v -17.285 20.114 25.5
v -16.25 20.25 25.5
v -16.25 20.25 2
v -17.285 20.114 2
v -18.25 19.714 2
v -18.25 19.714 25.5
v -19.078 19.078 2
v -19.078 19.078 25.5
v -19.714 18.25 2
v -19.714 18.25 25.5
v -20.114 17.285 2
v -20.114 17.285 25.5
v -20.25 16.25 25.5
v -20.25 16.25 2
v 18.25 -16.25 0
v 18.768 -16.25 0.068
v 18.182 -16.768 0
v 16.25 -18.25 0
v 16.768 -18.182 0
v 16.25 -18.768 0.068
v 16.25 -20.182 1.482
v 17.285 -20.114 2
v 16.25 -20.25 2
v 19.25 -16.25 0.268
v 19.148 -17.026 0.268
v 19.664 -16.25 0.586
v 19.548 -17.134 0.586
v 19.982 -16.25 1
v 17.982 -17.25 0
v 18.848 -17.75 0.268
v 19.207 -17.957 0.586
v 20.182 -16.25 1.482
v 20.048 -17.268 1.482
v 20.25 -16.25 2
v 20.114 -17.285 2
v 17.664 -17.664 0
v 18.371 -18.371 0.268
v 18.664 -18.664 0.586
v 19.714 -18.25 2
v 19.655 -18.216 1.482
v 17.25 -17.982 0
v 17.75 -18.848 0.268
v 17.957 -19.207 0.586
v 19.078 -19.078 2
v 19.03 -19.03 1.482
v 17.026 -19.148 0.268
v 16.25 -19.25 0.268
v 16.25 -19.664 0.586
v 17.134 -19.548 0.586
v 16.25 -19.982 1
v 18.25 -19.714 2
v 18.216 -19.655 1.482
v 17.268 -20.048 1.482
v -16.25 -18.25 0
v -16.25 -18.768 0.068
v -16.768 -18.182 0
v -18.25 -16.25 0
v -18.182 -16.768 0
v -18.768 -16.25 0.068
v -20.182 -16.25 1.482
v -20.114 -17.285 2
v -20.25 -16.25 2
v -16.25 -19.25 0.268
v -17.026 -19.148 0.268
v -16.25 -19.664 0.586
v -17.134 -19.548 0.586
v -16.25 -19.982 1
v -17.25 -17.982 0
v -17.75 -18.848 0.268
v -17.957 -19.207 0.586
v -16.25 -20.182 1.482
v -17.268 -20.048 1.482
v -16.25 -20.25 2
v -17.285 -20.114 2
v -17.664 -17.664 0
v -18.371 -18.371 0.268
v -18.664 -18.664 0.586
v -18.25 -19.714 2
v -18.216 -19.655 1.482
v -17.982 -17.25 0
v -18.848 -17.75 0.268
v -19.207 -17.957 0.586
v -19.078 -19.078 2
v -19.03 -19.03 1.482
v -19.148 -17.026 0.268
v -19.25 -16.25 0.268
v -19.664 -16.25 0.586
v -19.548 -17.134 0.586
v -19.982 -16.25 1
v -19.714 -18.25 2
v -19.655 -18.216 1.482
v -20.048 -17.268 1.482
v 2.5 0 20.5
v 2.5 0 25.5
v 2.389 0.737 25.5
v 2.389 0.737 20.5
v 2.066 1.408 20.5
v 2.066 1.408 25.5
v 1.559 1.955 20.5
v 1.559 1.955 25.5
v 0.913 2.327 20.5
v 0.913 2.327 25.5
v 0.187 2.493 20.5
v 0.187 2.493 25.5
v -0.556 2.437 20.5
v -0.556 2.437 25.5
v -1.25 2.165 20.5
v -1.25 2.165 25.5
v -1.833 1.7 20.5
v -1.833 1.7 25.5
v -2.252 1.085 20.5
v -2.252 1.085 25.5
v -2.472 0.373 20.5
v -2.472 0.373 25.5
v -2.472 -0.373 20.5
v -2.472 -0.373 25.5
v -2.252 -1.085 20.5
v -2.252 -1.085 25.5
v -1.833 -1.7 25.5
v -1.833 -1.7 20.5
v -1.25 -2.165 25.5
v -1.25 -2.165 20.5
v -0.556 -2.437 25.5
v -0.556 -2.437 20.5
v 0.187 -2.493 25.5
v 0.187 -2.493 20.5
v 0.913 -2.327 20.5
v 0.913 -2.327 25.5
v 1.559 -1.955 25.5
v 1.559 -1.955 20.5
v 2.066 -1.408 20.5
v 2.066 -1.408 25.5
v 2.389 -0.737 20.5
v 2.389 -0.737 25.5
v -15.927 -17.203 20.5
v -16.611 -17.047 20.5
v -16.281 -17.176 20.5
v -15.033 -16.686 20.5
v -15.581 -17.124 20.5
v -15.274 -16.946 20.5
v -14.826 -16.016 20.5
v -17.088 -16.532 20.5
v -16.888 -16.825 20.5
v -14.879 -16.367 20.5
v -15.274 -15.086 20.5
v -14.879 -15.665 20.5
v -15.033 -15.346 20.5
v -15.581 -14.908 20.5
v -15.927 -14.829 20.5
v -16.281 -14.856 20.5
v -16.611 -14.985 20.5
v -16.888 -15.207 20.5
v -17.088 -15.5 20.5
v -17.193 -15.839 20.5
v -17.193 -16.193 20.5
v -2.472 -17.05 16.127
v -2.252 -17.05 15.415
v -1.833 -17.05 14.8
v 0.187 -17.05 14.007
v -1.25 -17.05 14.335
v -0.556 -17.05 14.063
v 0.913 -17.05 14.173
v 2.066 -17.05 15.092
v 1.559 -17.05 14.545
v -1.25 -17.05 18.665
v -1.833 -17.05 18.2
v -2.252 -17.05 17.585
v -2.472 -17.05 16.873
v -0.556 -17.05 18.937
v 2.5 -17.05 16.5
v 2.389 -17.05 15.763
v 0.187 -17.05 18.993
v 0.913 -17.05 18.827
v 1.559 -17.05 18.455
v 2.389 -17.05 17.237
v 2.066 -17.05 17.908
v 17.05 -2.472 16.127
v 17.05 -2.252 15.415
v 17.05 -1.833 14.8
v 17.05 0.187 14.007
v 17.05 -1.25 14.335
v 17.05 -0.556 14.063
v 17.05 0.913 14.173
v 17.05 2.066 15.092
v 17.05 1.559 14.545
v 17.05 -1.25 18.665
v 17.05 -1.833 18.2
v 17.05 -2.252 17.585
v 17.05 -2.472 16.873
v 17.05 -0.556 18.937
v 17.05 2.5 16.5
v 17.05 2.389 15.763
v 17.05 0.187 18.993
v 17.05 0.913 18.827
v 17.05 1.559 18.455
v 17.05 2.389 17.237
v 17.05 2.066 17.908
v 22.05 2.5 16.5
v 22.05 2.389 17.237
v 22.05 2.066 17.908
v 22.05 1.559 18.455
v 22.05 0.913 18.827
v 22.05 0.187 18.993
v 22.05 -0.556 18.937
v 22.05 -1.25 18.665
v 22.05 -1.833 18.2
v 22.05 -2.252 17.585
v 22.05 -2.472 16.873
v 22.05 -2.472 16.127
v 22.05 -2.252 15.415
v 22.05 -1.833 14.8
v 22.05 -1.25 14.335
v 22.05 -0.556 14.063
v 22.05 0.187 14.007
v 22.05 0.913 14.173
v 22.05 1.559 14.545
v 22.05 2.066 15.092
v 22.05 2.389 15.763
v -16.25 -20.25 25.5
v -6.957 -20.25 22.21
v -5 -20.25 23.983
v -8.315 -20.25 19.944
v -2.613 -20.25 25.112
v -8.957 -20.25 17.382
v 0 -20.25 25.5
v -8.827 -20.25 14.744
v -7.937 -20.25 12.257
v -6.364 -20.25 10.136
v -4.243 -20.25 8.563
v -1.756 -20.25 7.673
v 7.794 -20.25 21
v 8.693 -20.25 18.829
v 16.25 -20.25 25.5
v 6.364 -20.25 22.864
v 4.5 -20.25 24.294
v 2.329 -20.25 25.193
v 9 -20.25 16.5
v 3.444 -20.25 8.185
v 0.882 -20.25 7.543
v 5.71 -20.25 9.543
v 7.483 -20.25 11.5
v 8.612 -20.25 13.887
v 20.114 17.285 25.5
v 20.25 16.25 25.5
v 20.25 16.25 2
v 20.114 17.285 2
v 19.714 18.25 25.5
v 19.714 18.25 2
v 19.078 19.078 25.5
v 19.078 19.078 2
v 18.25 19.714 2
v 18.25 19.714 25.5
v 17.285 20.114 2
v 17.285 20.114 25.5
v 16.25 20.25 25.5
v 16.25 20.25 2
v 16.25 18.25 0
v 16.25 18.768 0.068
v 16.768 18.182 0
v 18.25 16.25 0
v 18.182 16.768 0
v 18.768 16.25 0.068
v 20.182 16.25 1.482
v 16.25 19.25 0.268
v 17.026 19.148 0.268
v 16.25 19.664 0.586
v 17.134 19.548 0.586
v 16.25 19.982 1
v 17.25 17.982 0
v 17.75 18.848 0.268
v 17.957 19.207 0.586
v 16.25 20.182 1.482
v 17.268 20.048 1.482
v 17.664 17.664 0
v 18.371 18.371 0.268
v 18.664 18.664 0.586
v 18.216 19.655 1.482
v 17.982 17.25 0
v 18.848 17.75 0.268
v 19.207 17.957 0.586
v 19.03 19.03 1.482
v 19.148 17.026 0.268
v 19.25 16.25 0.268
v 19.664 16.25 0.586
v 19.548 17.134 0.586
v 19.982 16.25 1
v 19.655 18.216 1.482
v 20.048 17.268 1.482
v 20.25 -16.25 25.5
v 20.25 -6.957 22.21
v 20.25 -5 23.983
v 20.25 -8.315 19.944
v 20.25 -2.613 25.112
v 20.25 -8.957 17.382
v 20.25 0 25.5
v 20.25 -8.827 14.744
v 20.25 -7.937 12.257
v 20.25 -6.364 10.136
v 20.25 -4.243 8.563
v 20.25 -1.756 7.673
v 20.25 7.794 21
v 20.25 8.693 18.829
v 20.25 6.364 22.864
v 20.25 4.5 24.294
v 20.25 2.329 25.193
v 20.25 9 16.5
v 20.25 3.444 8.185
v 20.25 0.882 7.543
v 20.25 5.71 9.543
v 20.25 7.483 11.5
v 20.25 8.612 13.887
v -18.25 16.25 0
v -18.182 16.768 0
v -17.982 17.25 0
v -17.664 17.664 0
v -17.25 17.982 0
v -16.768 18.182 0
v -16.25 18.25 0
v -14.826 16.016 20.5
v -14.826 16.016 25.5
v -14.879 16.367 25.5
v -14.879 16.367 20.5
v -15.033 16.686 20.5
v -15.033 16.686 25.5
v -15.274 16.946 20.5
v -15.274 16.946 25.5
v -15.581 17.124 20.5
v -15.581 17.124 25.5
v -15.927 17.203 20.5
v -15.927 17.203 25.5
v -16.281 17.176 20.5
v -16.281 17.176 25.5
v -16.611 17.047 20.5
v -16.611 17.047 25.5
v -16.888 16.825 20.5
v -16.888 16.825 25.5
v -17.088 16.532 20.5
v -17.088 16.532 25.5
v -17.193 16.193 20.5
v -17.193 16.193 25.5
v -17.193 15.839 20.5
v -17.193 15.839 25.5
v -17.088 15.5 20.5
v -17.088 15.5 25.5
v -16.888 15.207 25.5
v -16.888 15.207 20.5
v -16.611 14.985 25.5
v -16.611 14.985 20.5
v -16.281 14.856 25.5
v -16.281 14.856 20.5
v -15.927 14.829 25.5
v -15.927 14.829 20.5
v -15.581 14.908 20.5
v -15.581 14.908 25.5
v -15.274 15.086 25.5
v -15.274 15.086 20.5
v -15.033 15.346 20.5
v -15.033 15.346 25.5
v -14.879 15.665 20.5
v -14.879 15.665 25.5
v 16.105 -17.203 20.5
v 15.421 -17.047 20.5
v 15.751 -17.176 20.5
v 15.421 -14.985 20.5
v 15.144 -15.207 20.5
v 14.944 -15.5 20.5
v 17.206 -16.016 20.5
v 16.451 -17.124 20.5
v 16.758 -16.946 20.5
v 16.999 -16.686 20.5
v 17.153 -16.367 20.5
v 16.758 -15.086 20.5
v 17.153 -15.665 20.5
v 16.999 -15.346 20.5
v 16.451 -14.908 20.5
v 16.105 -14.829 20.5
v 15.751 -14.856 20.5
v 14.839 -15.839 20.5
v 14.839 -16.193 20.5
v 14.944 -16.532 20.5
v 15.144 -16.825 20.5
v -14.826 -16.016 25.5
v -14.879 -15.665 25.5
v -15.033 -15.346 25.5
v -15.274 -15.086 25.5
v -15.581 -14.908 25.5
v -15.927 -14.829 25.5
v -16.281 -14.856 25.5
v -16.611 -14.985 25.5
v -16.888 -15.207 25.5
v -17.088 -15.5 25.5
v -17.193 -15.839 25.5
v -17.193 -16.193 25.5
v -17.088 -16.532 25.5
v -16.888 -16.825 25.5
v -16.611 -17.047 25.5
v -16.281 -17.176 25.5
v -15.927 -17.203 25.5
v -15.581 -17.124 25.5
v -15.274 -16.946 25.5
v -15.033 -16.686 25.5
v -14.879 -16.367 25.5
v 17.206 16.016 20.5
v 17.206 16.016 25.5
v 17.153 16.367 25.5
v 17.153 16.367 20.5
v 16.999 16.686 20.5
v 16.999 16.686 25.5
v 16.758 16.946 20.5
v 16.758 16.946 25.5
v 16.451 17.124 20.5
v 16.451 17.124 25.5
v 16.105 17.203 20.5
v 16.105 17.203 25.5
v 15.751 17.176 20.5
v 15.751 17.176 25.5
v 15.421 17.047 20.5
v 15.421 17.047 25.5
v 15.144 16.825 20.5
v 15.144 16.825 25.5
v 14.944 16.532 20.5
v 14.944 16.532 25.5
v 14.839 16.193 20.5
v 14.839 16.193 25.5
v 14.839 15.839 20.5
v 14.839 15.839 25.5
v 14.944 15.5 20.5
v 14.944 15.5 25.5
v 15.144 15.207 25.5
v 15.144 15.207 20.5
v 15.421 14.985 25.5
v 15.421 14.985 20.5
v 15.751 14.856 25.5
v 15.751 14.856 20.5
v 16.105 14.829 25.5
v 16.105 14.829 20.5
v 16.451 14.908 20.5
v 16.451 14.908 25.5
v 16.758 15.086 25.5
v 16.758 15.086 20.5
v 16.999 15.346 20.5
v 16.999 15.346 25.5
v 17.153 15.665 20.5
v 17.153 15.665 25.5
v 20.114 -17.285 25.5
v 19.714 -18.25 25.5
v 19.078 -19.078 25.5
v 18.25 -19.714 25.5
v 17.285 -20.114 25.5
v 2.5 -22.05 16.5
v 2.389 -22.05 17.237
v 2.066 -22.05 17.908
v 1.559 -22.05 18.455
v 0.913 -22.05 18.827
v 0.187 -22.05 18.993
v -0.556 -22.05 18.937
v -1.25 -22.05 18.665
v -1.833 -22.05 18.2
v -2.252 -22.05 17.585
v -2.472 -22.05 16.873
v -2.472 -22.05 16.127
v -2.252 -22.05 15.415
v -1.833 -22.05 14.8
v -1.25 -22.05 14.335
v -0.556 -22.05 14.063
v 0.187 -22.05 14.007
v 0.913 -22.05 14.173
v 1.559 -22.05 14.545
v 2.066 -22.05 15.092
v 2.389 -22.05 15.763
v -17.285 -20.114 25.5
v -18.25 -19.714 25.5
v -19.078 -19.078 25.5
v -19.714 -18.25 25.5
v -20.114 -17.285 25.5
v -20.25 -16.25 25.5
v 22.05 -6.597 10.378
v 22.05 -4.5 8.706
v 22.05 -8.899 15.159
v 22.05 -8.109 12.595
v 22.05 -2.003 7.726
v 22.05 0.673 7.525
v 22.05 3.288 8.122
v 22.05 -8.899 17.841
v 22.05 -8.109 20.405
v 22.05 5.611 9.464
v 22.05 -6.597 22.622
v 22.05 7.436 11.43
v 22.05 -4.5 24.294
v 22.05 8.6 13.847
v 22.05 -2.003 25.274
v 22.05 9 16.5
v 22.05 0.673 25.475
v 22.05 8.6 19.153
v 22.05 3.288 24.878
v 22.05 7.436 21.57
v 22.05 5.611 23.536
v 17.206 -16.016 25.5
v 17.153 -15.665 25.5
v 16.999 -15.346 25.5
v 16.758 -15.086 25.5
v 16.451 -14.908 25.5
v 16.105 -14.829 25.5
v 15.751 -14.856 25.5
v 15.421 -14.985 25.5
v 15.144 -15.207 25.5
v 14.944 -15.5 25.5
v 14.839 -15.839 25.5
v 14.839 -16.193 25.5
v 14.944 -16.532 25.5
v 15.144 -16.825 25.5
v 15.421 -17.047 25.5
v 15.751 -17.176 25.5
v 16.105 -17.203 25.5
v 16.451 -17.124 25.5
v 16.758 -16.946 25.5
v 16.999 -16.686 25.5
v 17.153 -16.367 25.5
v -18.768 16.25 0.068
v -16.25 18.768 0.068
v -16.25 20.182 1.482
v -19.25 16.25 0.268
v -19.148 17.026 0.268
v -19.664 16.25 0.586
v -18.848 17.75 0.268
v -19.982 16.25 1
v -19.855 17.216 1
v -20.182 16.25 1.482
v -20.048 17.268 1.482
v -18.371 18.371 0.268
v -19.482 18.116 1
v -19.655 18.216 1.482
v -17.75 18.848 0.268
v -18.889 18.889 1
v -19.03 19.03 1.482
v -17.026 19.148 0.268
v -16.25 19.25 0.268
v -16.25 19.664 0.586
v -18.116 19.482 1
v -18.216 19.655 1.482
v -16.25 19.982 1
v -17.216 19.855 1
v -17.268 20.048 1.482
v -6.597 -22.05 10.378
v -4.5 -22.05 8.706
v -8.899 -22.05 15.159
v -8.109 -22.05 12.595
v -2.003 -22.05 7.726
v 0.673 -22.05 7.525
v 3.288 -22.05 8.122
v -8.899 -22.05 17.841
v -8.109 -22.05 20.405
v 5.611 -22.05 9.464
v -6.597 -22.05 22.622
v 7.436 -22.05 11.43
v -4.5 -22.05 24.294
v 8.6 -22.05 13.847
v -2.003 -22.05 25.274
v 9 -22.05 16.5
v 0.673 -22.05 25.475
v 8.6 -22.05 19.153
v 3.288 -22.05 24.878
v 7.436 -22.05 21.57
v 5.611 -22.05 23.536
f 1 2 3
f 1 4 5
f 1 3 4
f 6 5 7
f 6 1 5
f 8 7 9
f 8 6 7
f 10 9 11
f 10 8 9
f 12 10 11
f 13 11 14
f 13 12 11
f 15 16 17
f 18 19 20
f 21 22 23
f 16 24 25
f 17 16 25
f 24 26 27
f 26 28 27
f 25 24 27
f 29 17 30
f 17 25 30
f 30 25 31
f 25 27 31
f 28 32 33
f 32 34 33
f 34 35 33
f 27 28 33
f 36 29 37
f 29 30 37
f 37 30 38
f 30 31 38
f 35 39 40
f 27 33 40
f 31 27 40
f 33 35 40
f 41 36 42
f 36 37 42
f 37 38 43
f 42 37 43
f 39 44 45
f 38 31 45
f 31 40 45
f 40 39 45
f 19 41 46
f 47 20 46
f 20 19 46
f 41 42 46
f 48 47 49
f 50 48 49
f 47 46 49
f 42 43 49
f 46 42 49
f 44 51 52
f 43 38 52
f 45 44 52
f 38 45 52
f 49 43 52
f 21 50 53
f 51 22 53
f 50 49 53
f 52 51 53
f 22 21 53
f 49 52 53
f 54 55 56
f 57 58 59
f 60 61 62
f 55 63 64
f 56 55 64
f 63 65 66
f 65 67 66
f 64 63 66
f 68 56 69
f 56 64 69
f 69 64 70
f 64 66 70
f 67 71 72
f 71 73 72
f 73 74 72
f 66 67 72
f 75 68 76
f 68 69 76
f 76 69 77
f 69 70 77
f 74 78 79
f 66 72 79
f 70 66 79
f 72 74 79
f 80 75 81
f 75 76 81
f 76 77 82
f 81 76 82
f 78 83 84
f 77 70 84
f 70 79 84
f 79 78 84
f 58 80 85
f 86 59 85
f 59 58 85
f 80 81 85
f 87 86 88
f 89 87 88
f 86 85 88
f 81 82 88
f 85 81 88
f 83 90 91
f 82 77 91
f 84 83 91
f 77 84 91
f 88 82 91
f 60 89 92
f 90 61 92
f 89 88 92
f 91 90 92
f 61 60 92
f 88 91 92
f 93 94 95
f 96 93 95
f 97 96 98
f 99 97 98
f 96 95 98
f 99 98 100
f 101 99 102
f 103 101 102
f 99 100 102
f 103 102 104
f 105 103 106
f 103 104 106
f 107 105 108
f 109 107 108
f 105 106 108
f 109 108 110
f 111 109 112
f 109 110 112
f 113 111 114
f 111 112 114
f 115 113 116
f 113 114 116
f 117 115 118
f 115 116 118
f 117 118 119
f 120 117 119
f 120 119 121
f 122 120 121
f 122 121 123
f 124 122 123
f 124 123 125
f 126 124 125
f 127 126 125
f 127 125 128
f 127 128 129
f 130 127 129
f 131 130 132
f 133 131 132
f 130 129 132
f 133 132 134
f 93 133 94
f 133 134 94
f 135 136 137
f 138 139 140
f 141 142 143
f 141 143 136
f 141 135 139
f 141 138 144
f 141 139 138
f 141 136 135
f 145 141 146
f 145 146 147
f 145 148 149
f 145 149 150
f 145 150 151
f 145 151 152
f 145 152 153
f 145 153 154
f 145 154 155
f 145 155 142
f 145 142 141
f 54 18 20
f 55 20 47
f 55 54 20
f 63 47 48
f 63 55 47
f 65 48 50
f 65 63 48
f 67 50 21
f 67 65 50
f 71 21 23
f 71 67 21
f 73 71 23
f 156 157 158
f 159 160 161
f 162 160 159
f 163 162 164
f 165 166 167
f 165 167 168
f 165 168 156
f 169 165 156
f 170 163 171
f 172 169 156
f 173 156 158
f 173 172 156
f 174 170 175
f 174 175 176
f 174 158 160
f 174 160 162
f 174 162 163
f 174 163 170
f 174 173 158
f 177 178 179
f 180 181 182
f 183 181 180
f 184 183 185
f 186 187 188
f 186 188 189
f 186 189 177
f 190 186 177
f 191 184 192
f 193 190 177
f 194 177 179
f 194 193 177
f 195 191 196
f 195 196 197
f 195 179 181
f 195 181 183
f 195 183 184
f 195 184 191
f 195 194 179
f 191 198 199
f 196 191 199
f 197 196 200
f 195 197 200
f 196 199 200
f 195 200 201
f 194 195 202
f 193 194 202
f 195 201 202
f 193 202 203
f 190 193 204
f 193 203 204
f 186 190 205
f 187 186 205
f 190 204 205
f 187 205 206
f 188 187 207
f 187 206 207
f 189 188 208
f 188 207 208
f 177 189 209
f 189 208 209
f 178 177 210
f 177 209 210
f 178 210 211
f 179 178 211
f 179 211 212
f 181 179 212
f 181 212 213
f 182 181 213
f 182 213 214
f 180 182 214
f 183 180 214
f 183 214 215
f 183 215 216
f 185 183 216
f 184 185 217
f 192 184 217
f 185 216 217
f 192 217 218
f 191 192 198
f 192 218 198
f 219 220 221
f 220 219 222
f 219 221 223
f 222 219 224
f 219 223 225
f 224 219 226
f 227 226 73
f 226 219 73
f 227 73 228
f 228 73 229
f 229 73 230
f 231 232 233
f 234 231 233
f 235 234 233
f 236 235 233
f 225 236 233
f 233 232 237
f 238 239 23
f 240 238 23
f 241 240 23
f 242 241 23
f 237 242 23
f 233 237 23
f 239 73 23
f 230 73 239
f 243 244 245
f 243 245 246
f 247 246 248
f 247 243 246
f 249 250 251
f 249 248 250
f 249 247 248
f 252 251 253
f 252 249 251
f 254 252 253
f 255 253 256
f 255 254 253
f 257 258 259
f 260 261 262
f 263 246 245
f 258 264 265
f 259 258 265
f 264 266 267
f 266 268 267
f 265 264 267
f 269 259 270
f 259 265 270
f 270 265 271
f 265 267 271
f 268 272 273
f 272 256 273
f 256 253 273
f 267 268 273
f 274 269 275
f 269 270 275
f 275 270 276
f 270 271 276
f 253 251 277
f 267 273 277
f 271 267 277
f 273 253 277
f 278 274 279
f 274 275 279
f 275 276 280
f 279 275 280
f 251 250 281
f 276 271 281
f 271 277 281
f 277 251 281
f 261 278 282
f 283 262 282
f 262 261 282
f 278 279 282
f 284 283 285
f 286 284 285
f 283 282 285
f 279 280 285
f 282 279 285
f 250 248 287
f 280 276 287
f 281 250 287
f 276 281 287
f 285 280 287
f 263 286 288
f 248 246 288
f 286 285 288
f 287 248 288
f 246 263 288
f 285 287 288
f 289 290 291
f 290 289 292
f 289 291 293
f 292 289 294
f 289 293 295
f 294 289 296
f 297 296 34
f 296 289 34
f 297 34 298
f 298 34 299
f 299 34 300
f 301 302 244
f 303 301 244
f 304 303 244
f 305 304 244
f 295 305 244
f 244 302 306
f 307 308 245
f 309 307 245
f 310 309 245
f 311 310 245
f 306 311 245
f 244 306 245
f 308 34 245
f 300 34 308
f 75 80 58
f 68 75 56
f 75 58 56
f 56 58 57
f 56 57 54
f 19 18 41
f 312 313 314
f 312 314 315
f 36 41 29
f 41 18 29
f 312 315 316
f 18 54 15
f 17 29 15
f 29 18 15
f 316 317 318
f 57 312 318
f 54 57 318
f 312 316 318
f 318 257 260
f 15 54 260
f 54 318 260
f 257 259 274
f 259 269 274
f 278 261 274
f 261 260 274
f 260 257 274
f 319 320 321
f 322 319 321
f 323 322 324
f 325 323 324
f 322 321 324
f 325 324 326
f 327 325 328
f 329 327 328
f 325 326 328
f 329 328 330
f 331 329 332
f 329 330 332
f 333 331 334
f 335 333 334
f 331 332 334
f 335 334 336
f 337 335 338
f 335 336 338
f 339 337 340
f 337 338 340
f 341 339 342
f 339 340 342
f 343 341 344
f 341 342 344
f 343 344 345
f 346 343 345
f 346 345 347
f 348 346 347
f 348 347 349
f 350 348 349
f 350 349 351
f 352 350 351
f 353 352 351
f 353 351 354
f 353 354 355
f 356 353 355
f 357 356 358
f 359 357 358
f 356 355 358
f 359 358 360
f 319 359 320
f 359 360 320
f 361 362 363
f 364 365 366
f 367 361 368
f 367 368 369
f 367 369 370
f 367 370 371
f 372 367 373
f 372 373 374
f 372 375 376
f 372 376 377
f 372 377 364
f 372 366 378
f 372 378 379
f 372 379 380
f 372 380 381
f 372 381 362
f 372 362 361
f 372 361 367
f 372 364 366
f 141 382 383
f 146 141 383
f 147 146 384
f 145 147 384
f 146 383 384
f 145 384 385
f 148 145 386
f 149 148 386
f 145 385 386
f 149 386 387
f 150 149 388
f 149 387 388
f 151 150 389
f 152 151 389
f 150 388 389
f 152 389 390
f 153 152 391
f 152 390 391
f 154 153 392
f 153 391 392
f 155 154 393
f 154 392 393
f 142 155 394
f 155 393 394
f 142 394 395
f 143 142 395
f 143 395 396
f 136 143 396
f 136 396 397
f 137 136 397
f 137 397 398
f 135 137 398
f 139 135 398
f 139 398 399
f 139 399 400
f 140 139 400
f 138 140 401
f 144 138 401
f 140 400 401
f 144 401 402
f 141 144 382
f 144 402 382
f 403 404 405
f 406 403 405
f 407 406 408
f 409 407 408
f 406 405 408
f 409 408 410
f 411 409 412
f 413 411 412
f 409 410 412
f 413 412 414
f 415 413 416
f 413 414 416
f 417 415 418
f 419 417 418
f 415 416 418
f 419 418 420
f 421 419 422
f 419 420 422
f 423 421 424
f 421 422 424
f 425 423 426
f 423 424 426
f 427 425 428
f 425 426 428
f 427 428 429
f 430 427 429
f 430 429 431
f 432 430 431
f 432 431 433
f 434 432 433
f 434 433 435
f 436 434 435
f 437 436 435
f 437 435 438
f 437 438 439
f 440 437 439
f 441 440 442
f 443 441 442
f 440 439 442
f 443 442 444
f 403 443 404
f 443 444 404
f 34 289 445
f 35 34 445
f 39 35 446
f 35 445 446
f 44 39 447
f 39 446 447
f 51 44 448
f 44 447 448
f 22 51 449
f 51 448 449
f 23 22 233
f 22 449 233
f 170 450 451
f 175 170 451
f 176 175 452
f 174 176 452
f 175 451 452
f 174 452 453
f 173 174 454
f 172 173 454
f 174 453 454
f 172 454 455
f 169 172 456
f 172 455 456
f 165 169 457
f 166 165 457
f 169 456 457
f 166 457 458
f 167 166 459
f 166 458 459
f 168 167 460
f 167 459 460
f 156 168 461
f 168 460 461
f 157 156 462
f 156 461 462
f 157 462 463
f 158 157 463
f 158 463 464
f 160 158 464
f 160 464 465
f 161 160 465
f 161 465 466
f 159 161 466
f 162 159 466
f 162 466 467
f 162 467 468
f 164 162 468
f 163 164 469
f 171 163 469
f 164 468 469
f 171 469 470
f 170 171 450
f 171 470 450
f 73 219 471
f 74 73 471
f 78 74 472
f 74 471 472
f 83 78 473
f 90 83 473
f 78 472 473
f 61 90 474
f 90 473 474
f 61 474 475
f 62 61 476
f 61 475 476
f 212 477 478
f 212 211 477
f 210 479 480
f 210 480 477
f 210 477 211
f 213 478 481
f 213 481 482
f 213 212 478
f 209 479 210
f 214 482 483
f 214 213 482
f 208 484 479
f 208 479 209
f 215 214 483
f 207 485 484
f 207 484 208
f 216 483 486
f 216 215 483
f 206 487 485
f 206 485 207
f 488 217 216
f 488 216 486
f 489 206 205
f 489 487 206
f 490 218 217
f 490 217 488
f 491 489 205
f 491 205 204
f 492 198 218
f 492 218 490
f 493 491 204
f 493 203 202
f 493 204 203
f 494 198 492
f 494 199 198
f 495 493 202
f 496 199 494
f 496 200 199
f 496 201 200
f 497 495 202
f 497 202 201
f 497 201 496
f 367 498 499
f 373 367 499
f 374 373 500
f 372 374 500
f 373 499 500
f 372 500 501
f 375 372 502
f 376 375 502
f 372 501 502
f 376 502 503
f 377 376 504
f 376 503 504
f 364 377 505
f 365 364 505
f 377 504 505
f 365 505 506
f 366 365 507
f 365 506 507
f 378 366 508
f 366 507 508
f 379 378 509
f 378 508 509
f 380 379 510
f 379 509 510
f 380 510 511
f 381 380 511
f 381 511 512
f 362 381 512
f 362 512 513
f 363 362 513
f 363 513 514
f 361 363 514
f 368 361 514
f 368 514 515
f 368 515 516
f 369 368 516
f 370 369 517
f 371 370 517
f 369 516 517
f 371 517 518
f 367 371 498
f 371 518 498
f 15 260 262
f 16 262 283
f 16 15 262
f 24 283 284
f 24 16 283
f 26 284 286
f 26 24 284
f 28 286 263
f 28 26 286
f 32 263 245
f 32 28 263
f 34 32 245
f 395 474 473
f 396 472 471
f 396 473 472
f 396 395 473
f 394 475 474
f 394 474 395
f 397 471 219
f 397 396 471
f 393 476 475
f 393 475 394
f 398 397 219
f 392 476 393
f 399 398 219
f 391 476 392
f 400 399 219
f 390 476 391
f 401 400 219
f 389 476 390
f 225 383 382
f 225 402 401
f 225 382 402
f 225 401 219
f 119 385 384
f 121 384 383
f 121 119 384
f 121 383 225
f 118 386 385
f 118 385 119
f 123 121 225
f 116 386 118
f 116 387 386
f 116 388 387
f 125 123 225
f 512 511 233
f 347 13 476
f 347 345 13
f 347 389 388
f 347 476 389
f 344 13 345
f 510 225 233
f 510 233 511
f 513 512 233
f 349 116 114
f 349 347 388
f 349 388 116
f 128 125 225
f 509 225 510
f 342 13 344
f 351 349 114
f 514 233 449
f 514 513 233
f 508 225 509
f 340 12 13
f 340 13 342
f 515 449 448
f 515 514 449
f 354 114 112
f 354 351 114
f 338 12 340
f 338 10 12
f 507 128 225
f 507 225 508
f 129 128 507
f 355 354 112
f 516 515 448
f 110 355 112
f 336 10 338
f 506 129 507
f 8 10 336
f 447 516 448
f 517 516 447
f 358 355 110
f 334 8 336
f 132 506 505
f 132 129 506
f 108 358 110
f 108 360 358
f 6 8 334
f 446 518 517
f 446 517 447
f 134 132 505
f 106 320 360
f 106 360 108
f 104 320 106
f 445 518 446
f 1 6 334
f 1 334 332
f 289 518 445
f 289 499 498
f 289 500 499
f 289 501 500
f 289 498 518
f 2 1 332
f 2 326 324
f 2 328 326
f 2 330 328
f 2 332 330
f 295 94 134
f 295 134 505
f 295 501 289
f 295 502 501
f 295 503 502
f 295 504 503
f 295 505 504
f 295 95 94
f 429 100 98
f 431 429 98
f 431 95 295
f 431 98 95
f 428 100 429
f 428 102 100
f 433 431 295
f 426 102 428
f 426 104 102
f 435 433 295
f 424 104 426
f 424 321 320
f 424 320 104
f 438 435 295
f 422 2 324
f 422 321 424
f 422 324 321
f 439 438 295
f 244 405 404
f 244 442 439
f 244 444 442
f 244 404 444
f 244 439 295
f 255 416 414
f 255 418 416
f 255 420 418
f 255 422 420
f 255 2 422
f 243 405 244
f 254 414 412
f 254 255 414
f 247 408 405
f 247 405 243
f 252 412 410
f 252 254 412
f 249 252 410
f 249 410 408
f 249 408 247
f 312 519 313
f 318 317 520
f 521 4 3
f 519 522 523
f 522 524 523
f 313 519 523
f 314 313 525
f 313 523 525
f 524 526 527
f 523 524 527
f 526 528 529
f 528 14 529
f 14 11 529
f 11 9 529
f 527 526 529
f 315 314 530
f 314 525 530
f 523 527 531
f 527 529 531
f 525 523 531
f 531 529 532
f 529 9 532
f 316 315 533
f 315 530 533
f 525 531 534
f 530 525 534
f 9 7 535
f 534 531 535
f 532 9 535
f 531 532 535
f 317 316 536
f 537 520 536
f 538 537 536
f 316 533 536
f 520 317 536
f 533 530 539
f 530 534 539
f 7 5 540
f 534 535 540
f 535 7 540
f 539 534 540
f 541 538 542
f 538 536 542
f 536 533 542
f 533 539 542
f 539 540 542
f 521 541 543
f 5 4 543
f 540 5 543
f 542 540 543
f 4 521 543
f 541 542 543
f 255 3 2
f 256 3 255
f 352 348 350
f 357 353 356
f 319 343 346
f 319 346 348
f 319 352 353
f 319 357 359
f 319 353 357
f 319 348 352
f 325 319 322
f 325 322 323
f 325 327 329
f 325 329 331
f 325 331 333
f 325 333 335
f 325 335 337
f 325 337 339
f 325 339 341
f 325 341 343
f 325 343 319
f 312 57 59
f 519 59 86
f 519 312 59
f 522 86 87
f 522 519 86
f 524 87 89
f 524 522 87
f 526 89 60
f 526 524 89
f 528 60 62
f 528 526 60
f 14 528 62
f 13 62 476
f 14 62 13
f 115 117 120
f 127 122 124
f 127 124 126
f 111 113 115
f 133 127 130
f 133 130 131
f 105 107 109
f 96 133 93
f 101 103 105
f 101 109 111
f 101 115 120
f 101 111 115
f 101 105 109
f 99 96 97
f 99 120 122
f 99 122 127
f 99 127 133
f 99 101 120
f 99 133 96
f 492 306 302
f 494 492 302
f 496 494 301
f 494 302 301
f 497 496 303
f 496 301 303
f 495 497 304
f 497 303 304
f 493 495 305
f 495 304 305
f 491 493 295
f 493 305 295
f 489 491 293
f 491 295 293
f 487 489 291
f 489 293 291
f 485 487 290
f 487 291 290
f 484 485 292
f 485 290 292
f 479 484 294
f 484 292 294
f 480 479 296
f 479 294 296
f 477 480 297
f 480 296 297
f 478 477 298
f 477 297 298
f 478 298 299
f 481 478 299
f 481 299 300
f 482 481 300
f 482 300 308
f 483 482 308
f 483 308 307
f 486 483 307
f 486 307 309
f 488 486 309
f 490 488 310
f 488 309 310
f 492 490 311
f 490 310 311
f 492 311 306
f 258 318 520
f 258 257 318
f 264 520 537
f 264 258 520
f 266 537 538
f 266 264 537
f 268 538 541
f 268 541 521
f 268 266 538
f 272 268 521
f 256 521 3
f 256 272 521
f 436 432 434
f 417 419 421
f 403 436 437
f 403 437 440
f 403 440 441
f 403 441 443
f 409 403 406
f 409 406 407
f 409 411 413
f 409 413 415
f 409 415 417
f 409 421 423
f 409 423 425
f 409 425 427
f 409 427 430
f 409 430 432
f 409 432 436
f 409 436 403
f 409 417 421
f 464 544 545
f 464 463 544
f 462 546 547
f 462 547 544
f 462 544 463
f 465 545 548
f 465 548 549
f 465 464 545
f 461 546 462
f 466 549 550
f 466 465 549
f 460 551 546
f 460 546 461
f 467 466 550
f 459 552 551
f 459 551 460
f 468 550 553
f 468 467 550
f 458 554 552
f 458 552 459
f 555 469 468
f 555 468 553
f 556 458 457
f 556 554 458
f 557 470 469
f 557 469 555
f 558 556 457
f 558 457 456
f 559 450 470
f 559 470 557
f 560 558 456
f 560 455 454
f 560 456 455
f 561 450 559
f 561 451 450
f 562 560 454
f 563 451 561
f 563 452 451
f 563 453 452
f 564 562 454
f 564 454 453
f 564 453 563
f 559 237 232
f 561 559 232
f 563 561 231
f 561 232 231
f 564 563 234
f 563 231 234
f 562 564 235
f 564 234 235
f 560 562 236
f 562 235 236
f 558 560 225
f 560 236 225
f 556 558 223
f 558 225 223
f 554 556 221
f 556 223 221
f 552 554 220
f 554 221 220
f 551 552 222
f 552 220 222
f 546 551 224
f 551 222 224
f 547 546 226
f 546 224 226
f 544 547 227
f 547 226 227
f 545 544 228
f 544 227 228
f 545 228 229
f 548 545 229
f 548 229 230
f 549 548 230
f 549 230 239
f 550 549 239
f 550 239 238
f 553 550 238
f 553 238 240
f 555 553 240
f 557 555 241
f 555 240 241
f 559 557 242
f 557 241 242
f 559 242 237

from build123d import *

# Parameters (mm, degrees)
SKETCH_W              = 40.5
SKETCH_H              = 40.5
PAD_DEPTH             = 25.5
SKETCH001_R           = 9
PAD001_DEPTH          = 1.8
POLARPATTERN_COUNT    = 2
POLARPATTERN_ANGLE    = 90
SKETCH002_R           = 2.5
POCKET_DEPTH          = 5
POLARPATTERN001_COUNT = 2
POLARPATTERN001_ANGLE = 90
SKETCH003_R           = 2.5
SKETCH003_R_2         = 1.19
POCKET001_DEPTH       = 5
POCKET002_DEPTH       = 5
FILLET_R              = 4
FILLET001_R           = 2


with BuildPart() as part:
    # Sketch → Pad (new body)
    with BuildSketch(Plane.XY):
        Rectangle(SKETCH_W, SKETCH_H)
    extrude(amount=PAD_DEPTH)

    # Sketch001 (on Face3 of Pad) → Pad001 (join)
    with BuildSketch(Plane.XZ.offset(20.25)):
        with Locations((0, 16.5)):
            Circle(SKETCH001_R)
    pad001 = extrude(amount=PAD001_DEPTH)

    # PolarPattern: Pad001 ×2 about axis
    polarpattern_axis = Axis((0, 0, 0), (0, 0, 1))
    for i in range(1, POLARPATTERN_COUNT):
        add(pad001.rotate(polarpattern_axis, i * POLARPATTERN_ANGLE / (POLARPATTERN_COUNT - 1)))

    # Sketch002 (on Face10 of PolarPattern) → Pocket (cut)
    with BuildSketch(Plane.XZ.offset(22.05)):
        with Locations((0, 16.5)):
            Circle(SKETCH002_R)
    pocket = extrude(amount=-POCKET_DEPTH, mode=Mode.SUBTRACT)

    # PolarPattern001: Pocket ×2 about axis
    polarpattern001_axis = Axis((0, 0, 0), (0, 0, 1))
    for i in range(1, POLARPATTERN001_COUNT):
        add(pocket.rotate(polarpattern001_axis, i * POLARPATTERN001_ANGLE / (POLARPATTERN001_COUNT - 1)), mode=Mode.SUBTRACT)

    # Sketch003 (on Face5 of PolarPattern001) → Pocket001 (cut)
    with BuildSketch(Plane.XY.offset(25.5)):
        Circle(SKETCH003_R)
        with Locations((-16.015969, 16.015969)):
            Circle(SKETCH003_R_2)
        with Locations((16.015969, 16.015969)):
            Circle(SKETCH003_R_2)
        with Locations((-16.015969, -16.015969)):
            Circle(SKETCH003_R_2)
        with Locations((16.015969, -16.015969)):
            Circle(SKETCH003_R_2)
    extrude(amount=-POCKET001_DEPTH, mode=Mode.SUBTRACT)

    # Sketch003 (on Face5 of PolarPattern001) → Pocket002 (cut)
    with BuildSketch(Plane.XY.offset(25.5)):
        Circle(SKETCH003_R)
        with Locations((-16.015969, 16.015969)):
            Circle(SKETCH003_R_2)
        with Locations((16.015969, 16.015969)):
            Circle(SKETCH003_R_2)
        with Locations((-16.015969, -16.015969)):
            Circle(SKETCH003_R_2)
        with Locations((16.015969, -16.015969)):
            Circle(SKETCH003_R_2)
    extrude(amount=-POCKET002_DEPTH, mode=Mode.SUBTRACT)

    # Fillet
    fillet_edges = [part.edges().sort_by_distance(p)[0] for p in [
        (20.25, 20.25, 12.75),
        (20.25, -20.25, 12.75),
        (-20.25, -20.25, 12.75),
        (-20.25, 20.25, 12.75),
    ]]
    fillet(fillet_edges, radius=FILLET_R)

    # Fillet001
    fillet001_edges = [part.edges().sort_by_distance(p)[0] for p in [
        (0, 20.25, 0),
        (-19.078427, 19.078427, 0),
        (19.078427, 19.078427, 0),
        (-20.25, 0, 0),
        (20.25, 0, 0),
        (-19.078427, -19.078427, 0),
        (19.078427, -19.078427, 0),
        (0, -20.25, 0),
    ]]
    fillet(fillet001_edges, radius=FILLET001_R)


solid = part.part
